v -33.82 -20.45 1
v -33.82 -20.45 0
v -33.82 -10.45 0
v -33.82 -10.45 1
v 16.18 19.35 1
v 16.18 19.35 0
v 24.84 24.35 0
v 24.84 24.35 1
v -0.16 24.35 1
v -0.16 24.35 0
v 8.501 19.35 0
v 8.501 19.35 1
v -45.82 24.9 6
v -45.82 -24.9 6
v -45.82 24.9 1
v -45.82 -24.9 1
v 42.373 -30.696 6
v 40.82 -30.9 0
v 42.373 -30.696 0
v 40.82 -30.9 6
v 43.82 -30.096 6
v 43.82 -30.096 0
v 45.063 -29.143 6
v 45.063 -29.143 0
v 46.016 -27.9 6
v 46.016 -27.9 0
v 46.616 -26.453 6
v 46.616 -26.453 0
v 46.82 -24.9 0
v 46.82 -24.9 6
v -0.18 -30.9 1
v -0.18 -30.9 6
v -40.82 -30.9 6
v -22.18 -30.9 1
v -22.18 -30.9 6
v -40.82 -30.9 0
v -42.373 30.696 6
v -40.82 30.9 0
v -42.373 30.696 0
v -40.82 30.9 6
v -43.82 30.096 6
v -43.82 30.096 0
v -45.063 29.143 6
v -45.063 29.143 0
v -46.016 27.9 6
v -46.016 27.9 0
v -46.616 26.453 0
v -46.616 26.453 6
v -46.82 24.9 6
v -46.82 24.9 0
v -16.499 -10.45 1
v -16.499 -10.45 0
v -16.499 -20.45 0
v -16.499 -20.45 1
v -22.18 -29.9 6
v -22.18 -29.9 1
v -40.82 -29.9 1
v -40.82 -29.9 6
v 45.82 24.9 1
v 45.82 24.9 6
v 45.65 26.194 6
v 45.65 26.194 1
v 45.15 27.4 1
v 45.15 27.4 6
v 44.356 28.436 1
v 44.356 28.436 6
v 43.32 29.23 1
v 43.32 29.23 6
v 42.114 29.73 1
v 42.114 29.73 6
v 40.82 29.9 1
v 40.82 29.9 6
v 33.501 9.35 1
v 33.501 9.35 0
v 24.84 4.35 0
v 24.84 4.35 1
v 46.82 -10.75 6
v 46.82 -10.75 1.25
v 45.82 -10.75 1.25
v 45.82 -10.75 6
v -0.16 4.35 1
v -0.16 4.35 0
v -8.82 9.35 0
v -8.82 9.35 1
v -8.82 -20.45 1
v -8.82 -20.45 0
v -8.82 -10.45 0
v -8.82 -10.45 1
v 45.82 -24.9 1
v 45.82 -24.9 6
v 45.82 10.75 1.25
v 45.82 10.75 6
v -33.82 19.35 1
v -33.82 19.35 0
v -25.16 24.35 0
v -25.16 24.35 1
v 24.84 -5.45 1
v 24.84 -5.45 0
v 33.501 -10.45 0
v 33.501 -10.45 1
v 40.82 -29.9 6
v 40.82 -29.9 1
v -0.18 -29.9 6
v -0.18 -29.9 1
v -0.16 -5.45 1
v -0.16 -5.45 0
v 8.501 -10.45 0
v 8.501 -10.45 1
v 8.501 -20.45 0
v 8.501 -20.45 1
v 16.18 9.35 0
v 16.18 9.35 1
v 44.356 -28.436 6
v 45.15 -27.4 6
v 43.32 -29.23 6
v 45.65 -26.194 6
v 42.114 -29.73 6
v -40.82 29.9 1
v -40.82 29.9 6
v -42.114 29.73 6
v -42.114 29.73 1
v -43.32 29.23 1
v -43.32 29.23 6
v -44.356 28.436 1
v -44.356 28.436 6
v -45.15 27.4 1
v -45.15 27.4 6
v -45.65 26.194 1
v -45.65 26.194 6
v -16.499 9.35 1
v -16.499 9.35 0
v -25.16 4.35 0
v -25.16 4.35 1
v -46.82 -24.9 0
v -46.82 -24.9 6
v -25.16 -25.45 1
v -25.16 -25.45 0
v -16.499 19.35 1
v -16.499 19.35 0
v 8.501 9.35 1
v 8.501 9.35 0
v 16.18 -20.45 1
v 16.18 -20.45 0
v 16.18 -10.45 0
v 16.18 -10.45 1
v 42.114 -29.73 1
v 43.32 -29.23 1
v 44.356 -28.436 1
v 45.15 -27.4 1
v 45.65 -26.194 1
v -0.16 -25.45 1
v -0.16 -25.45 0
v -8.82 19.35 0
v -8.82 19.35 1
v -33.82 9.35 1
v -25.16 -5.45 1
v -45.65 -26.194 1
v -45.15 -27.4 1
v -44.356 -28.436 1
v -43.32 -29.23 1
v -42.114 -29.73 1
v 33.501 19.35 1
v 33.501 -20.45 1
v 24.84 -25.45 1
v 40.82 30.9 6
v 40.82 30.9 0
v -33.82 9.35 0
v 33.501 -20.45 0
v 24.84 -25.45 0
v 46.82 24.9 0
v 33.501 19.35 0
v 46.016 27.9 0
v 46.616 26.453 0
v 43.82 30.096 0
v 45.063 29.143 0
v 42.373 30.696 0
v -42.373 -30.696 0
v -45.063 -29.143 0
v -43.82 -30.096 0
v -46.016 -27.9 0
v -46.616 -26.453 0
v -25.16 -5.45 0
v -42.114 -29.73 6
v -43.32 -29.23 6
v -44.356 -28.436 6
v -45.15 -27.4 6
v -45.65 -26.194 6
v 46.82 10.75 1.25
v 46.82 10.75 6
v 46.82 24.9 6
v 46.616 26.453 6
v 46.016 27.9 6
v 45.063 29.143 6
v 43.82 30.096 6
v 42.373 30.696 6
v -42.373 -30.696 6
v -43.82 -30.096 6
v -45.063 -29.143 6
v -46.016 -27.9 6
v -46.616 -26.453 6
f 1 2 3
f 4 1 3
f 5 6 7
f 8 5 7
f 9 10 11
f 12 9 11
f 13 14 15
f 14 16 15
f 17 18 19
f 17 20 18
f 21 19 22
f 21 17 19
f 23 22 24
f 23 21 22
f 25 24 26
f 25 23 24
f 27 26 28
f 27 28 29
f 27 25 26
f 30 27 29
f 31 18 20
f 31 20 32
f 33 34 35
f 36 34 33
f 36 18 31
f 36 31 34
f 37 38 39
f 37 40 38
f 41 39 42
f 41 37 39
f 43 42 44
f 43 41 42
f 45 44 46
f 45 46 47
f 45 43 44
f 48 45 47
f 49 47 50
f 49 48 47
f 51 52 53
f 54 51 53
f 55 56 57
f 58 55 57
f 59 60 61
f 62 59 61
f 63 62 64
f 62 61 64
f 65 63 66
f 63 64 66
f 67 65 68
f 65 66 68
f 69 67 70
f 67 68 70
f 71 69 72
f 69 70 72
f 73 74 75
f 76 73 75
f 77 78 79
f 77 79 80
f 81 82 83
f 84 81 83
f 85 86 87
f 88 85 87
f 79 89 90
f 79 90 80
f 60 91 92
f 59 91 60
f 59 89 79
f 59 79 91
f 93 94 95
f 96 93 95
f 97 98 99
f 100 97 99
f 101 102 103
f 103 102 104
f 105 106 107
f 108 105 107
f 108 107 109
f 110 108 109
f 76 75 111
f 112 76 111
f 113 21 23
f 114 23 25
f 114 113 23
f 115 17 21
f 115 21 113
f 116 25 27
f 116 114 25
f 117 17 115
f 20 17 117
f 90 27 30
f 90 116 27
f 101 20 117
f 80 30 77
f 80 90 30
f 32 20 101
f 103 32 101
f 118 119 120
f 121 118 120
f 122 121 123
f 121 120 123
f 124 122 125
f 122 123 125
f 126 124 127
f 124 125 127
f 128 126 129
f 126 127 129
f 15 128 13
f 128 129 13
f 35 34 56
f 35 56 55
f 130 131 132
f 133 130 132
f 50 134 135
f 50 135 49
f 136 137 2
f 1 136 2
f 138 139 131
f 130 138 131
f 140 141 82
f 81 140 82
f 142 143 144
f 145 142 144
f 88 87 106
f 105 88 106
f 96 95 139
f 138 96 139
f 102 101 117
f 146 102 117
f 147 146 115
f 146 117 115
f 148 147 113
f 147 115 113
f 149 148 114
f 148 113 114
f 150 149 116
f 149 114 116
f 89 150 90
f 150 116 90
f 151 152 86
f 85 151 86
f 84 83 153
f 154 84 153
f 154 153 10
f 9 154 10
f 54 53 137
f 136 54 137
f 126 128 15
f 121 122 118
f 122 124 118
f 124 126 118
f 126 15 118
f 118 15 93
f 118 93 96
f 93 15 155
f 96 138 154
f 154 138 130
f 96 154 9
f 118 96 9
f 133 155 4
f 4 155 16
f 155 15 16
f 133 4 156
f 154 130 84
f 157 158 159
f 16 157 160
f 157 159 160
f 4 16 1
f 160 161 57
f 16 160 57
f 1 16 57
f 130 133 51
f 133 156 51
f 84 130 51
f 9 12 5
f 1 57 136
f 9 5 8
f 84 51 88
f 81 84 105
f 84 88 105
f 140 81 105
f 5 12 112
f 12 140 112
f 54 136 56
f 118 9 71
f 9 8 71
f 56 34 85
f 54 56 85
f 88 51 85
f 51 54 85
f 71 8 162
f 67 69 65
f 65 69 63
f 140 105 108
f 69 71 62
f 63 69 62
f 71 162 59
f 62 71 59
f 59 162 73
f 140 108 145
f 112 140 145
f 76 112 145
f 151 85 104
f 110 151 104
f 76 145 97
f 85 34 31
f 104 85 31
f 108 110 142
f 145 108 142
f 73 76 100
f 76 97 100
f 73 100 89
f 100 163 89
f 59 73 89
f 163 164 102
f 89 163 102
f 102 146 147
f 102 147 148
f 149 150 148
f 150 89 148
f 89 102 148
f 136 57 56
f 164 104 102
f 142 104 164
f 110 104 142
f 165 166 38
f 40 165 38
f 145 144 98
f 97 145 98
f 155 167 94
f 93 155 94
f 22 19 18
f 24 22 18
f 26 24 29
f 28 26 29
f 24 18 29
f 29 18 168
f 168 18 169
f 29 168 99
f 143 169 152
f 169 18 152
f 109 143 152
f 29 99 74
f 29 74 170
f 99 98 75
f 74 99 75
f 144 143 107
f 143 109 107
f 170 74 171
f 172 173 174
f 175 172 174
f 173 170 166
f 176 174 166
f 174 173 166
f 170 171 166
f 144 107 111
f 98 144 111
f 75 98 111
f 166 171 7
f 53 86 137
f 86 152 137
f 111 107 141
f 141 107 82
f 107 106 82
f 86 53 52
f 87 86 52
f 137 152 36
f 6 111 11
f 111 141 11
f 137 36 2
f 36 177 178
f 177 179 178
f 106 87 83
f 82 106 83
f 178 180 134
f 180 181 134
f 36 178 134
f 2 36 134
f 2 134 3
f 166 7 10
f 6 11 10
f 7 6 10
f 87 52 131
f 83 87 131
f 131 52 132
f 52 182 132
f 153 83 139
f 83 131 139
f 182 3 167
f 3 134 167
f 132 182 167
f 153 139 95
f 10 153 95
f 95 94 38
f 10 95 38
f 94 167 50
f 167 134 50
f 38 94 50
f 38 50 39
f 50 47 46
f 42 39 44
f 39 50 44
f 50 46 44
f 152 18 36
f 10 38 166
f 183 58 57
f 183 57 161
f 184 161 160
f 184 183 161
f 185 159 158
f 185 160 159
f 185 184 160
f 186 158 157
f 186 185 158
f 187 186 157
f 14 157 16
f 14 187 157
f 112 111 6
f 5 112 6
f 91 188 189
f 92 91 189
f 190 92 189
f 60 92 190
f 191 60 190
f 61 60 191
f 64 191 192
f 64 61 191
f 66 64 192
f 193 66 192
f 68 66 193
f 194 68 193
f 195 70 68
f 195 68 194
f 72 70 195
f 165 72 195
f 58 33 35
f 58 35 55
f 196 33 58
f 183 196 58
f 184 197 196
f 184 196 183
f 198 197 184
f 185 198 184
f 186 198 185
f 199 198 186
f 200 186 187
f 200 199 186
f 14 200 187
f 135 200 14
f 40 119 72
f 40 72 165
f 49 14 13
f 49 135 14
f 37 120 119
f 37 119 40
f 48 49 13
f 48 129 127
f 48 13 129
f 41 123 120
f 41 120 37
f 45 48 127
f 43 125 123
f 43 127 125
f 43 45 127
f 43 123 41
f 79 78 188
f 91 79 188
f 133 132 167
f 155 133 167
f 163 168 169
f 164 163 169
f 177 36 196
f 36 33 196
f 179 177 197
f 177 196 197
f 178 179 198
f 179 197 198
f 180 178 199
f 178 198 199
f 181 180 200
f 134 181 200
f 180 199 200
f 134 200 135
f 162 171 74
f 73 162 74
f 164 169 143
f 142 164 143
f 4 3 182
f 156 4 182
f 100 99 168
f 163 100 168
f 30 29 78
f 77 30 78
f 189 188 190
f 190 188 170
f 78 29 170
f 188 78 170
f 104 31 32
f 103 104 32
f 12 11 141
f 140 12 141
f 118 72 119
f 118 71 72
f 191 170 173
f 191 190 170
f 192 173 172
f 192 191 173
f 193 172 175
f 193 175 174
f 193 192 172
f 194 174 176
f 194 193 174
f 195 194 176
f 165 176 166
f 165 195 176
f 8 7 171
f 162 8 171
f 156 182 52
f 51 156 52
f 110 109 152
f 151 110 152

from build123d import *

# Parameters (mm, degrees)
SKIZZE1_W                       = 61.8
SKIZZE1_H                       = 93.64
AUFSATZ_LINEAR_AUSTRAGEN1_DEPTH = 6
VERRUNDUNG1_R                   = 6
WANDUNG1_T                      = -1
SKIZZE2_W                       = 21.5
SKIZZE2_H                       = 9.5
SCHNITT_LINEAR_AUSTRAGEN1_DEPTH = 6
SKIZZE3_W                       = 22
SKIZZE3_H                       = 5
SCHNITT_LINEAR_AUSTRAGEN2_DEPTH = 6
SCHNITT_LINEAR_AUSTRAGEN4_DEPTH = 6
LINEARES_MUSTER1_COUNT          = 3
LINEARES_MUSTER1_PITCH          = 25


with BuildPart() as part:
    # Skizze1 → Aufsatz-Linear austragen1 (new body)
    with BuildSketch(Plane(origin=(0, 0, 0), x_dir=(0, 1, 0), z_dir=(0, 0, 1))):
        Rectangle(SKIZZE1_W, SKIZZE1_H)
    extrude(amount=AUFSATZ_LINEAR_AUSTRAGEN1_DEPTH)

    # Verrundung1
    verrundung1_edges = [part.edges().sort_by_distance(p)[0] for p in [
        (46.82, 30.9, 3),
        (46.82, -30.9, 3),
        (-46.82, -30.9, 3),
        (-46.82, 30.9, 3),
    ]]
    fillet(verrundung1_edges, radius=VERRUNDUNG1_R)

    # Wandung1
    wandung1_openings = [part.faces().sort_by_distance(p)[0] for p in [
        (0, 0, 6),
    ]]
    offset(amount=WANDUNG1_T, openings=wandung1_openings, kind=Kind.INTERSECTION)

    # Skizze2 → Schnitt-Linear austragen1 (cut)
    with BuildSketch(Plane.YZ.offset(46.82)):
        with Locations((0, 6)):
            Rectangle(SKIZZE2_W, SKIZZE2_H)
    extrude(amount=-SCHNITT_LINEAR_AUSTRAGEN1_DEPTH, mode=Mode.SUBTRACT)

    # Skizze3 → Schnitt-Linear austragen2 (cut)
    with BuildSketch(Plane.XZ.offset(30.9)):
        with Locations((-11.18, 3.5)):
            Rectangle(SKIZZE3_W, SKIZZE3_H)
    extrude(amount=-SCHNITT_LINEAR_AUSTRAGEN2_DEPTH, mode=Mode.SUBTRACT)

    # Skizze4 → Schnitt-Linear austragen4 (cut)
    with BuildSketch(Plane(origin=(0, 0, 0), x_dir=(1, 0, 0), z_dir=(0, 0, -1))):
        Polygon((-25.159745962, 25.45), (-33.82, 20.45), (-33.82, 10.45), (-25.159745962, 5.45), (-16.499491924, 10.45), (-16.499491924, 20.45), align=None)
        Polygon((-25.159745962, -4.35), (-33.82, -9.35), (-33.82, -19.35), (-25.159745962, -24.35), (-16.499491924, -19.35), (-16.499491924, -9.35), align=None)
    schnitt_linear_austragen4 = extrude(amount=-SCHNITT_LINEAR_AUSTRAGEN4_DEPTH, mode=Mode.SUBTRACT)

    # Lineares Muster1: Schnitt-Linear austragen4 ×3
    with Locations(*[(i * LINEARES_MUSTER1_PITCH, 0, 0) for i in range(1, LINEARES_MUSTER1_COUNT)]):
        add(schnitt_linear_austragen4, mode=Mode.SUBTRACT)


solid = part.part
